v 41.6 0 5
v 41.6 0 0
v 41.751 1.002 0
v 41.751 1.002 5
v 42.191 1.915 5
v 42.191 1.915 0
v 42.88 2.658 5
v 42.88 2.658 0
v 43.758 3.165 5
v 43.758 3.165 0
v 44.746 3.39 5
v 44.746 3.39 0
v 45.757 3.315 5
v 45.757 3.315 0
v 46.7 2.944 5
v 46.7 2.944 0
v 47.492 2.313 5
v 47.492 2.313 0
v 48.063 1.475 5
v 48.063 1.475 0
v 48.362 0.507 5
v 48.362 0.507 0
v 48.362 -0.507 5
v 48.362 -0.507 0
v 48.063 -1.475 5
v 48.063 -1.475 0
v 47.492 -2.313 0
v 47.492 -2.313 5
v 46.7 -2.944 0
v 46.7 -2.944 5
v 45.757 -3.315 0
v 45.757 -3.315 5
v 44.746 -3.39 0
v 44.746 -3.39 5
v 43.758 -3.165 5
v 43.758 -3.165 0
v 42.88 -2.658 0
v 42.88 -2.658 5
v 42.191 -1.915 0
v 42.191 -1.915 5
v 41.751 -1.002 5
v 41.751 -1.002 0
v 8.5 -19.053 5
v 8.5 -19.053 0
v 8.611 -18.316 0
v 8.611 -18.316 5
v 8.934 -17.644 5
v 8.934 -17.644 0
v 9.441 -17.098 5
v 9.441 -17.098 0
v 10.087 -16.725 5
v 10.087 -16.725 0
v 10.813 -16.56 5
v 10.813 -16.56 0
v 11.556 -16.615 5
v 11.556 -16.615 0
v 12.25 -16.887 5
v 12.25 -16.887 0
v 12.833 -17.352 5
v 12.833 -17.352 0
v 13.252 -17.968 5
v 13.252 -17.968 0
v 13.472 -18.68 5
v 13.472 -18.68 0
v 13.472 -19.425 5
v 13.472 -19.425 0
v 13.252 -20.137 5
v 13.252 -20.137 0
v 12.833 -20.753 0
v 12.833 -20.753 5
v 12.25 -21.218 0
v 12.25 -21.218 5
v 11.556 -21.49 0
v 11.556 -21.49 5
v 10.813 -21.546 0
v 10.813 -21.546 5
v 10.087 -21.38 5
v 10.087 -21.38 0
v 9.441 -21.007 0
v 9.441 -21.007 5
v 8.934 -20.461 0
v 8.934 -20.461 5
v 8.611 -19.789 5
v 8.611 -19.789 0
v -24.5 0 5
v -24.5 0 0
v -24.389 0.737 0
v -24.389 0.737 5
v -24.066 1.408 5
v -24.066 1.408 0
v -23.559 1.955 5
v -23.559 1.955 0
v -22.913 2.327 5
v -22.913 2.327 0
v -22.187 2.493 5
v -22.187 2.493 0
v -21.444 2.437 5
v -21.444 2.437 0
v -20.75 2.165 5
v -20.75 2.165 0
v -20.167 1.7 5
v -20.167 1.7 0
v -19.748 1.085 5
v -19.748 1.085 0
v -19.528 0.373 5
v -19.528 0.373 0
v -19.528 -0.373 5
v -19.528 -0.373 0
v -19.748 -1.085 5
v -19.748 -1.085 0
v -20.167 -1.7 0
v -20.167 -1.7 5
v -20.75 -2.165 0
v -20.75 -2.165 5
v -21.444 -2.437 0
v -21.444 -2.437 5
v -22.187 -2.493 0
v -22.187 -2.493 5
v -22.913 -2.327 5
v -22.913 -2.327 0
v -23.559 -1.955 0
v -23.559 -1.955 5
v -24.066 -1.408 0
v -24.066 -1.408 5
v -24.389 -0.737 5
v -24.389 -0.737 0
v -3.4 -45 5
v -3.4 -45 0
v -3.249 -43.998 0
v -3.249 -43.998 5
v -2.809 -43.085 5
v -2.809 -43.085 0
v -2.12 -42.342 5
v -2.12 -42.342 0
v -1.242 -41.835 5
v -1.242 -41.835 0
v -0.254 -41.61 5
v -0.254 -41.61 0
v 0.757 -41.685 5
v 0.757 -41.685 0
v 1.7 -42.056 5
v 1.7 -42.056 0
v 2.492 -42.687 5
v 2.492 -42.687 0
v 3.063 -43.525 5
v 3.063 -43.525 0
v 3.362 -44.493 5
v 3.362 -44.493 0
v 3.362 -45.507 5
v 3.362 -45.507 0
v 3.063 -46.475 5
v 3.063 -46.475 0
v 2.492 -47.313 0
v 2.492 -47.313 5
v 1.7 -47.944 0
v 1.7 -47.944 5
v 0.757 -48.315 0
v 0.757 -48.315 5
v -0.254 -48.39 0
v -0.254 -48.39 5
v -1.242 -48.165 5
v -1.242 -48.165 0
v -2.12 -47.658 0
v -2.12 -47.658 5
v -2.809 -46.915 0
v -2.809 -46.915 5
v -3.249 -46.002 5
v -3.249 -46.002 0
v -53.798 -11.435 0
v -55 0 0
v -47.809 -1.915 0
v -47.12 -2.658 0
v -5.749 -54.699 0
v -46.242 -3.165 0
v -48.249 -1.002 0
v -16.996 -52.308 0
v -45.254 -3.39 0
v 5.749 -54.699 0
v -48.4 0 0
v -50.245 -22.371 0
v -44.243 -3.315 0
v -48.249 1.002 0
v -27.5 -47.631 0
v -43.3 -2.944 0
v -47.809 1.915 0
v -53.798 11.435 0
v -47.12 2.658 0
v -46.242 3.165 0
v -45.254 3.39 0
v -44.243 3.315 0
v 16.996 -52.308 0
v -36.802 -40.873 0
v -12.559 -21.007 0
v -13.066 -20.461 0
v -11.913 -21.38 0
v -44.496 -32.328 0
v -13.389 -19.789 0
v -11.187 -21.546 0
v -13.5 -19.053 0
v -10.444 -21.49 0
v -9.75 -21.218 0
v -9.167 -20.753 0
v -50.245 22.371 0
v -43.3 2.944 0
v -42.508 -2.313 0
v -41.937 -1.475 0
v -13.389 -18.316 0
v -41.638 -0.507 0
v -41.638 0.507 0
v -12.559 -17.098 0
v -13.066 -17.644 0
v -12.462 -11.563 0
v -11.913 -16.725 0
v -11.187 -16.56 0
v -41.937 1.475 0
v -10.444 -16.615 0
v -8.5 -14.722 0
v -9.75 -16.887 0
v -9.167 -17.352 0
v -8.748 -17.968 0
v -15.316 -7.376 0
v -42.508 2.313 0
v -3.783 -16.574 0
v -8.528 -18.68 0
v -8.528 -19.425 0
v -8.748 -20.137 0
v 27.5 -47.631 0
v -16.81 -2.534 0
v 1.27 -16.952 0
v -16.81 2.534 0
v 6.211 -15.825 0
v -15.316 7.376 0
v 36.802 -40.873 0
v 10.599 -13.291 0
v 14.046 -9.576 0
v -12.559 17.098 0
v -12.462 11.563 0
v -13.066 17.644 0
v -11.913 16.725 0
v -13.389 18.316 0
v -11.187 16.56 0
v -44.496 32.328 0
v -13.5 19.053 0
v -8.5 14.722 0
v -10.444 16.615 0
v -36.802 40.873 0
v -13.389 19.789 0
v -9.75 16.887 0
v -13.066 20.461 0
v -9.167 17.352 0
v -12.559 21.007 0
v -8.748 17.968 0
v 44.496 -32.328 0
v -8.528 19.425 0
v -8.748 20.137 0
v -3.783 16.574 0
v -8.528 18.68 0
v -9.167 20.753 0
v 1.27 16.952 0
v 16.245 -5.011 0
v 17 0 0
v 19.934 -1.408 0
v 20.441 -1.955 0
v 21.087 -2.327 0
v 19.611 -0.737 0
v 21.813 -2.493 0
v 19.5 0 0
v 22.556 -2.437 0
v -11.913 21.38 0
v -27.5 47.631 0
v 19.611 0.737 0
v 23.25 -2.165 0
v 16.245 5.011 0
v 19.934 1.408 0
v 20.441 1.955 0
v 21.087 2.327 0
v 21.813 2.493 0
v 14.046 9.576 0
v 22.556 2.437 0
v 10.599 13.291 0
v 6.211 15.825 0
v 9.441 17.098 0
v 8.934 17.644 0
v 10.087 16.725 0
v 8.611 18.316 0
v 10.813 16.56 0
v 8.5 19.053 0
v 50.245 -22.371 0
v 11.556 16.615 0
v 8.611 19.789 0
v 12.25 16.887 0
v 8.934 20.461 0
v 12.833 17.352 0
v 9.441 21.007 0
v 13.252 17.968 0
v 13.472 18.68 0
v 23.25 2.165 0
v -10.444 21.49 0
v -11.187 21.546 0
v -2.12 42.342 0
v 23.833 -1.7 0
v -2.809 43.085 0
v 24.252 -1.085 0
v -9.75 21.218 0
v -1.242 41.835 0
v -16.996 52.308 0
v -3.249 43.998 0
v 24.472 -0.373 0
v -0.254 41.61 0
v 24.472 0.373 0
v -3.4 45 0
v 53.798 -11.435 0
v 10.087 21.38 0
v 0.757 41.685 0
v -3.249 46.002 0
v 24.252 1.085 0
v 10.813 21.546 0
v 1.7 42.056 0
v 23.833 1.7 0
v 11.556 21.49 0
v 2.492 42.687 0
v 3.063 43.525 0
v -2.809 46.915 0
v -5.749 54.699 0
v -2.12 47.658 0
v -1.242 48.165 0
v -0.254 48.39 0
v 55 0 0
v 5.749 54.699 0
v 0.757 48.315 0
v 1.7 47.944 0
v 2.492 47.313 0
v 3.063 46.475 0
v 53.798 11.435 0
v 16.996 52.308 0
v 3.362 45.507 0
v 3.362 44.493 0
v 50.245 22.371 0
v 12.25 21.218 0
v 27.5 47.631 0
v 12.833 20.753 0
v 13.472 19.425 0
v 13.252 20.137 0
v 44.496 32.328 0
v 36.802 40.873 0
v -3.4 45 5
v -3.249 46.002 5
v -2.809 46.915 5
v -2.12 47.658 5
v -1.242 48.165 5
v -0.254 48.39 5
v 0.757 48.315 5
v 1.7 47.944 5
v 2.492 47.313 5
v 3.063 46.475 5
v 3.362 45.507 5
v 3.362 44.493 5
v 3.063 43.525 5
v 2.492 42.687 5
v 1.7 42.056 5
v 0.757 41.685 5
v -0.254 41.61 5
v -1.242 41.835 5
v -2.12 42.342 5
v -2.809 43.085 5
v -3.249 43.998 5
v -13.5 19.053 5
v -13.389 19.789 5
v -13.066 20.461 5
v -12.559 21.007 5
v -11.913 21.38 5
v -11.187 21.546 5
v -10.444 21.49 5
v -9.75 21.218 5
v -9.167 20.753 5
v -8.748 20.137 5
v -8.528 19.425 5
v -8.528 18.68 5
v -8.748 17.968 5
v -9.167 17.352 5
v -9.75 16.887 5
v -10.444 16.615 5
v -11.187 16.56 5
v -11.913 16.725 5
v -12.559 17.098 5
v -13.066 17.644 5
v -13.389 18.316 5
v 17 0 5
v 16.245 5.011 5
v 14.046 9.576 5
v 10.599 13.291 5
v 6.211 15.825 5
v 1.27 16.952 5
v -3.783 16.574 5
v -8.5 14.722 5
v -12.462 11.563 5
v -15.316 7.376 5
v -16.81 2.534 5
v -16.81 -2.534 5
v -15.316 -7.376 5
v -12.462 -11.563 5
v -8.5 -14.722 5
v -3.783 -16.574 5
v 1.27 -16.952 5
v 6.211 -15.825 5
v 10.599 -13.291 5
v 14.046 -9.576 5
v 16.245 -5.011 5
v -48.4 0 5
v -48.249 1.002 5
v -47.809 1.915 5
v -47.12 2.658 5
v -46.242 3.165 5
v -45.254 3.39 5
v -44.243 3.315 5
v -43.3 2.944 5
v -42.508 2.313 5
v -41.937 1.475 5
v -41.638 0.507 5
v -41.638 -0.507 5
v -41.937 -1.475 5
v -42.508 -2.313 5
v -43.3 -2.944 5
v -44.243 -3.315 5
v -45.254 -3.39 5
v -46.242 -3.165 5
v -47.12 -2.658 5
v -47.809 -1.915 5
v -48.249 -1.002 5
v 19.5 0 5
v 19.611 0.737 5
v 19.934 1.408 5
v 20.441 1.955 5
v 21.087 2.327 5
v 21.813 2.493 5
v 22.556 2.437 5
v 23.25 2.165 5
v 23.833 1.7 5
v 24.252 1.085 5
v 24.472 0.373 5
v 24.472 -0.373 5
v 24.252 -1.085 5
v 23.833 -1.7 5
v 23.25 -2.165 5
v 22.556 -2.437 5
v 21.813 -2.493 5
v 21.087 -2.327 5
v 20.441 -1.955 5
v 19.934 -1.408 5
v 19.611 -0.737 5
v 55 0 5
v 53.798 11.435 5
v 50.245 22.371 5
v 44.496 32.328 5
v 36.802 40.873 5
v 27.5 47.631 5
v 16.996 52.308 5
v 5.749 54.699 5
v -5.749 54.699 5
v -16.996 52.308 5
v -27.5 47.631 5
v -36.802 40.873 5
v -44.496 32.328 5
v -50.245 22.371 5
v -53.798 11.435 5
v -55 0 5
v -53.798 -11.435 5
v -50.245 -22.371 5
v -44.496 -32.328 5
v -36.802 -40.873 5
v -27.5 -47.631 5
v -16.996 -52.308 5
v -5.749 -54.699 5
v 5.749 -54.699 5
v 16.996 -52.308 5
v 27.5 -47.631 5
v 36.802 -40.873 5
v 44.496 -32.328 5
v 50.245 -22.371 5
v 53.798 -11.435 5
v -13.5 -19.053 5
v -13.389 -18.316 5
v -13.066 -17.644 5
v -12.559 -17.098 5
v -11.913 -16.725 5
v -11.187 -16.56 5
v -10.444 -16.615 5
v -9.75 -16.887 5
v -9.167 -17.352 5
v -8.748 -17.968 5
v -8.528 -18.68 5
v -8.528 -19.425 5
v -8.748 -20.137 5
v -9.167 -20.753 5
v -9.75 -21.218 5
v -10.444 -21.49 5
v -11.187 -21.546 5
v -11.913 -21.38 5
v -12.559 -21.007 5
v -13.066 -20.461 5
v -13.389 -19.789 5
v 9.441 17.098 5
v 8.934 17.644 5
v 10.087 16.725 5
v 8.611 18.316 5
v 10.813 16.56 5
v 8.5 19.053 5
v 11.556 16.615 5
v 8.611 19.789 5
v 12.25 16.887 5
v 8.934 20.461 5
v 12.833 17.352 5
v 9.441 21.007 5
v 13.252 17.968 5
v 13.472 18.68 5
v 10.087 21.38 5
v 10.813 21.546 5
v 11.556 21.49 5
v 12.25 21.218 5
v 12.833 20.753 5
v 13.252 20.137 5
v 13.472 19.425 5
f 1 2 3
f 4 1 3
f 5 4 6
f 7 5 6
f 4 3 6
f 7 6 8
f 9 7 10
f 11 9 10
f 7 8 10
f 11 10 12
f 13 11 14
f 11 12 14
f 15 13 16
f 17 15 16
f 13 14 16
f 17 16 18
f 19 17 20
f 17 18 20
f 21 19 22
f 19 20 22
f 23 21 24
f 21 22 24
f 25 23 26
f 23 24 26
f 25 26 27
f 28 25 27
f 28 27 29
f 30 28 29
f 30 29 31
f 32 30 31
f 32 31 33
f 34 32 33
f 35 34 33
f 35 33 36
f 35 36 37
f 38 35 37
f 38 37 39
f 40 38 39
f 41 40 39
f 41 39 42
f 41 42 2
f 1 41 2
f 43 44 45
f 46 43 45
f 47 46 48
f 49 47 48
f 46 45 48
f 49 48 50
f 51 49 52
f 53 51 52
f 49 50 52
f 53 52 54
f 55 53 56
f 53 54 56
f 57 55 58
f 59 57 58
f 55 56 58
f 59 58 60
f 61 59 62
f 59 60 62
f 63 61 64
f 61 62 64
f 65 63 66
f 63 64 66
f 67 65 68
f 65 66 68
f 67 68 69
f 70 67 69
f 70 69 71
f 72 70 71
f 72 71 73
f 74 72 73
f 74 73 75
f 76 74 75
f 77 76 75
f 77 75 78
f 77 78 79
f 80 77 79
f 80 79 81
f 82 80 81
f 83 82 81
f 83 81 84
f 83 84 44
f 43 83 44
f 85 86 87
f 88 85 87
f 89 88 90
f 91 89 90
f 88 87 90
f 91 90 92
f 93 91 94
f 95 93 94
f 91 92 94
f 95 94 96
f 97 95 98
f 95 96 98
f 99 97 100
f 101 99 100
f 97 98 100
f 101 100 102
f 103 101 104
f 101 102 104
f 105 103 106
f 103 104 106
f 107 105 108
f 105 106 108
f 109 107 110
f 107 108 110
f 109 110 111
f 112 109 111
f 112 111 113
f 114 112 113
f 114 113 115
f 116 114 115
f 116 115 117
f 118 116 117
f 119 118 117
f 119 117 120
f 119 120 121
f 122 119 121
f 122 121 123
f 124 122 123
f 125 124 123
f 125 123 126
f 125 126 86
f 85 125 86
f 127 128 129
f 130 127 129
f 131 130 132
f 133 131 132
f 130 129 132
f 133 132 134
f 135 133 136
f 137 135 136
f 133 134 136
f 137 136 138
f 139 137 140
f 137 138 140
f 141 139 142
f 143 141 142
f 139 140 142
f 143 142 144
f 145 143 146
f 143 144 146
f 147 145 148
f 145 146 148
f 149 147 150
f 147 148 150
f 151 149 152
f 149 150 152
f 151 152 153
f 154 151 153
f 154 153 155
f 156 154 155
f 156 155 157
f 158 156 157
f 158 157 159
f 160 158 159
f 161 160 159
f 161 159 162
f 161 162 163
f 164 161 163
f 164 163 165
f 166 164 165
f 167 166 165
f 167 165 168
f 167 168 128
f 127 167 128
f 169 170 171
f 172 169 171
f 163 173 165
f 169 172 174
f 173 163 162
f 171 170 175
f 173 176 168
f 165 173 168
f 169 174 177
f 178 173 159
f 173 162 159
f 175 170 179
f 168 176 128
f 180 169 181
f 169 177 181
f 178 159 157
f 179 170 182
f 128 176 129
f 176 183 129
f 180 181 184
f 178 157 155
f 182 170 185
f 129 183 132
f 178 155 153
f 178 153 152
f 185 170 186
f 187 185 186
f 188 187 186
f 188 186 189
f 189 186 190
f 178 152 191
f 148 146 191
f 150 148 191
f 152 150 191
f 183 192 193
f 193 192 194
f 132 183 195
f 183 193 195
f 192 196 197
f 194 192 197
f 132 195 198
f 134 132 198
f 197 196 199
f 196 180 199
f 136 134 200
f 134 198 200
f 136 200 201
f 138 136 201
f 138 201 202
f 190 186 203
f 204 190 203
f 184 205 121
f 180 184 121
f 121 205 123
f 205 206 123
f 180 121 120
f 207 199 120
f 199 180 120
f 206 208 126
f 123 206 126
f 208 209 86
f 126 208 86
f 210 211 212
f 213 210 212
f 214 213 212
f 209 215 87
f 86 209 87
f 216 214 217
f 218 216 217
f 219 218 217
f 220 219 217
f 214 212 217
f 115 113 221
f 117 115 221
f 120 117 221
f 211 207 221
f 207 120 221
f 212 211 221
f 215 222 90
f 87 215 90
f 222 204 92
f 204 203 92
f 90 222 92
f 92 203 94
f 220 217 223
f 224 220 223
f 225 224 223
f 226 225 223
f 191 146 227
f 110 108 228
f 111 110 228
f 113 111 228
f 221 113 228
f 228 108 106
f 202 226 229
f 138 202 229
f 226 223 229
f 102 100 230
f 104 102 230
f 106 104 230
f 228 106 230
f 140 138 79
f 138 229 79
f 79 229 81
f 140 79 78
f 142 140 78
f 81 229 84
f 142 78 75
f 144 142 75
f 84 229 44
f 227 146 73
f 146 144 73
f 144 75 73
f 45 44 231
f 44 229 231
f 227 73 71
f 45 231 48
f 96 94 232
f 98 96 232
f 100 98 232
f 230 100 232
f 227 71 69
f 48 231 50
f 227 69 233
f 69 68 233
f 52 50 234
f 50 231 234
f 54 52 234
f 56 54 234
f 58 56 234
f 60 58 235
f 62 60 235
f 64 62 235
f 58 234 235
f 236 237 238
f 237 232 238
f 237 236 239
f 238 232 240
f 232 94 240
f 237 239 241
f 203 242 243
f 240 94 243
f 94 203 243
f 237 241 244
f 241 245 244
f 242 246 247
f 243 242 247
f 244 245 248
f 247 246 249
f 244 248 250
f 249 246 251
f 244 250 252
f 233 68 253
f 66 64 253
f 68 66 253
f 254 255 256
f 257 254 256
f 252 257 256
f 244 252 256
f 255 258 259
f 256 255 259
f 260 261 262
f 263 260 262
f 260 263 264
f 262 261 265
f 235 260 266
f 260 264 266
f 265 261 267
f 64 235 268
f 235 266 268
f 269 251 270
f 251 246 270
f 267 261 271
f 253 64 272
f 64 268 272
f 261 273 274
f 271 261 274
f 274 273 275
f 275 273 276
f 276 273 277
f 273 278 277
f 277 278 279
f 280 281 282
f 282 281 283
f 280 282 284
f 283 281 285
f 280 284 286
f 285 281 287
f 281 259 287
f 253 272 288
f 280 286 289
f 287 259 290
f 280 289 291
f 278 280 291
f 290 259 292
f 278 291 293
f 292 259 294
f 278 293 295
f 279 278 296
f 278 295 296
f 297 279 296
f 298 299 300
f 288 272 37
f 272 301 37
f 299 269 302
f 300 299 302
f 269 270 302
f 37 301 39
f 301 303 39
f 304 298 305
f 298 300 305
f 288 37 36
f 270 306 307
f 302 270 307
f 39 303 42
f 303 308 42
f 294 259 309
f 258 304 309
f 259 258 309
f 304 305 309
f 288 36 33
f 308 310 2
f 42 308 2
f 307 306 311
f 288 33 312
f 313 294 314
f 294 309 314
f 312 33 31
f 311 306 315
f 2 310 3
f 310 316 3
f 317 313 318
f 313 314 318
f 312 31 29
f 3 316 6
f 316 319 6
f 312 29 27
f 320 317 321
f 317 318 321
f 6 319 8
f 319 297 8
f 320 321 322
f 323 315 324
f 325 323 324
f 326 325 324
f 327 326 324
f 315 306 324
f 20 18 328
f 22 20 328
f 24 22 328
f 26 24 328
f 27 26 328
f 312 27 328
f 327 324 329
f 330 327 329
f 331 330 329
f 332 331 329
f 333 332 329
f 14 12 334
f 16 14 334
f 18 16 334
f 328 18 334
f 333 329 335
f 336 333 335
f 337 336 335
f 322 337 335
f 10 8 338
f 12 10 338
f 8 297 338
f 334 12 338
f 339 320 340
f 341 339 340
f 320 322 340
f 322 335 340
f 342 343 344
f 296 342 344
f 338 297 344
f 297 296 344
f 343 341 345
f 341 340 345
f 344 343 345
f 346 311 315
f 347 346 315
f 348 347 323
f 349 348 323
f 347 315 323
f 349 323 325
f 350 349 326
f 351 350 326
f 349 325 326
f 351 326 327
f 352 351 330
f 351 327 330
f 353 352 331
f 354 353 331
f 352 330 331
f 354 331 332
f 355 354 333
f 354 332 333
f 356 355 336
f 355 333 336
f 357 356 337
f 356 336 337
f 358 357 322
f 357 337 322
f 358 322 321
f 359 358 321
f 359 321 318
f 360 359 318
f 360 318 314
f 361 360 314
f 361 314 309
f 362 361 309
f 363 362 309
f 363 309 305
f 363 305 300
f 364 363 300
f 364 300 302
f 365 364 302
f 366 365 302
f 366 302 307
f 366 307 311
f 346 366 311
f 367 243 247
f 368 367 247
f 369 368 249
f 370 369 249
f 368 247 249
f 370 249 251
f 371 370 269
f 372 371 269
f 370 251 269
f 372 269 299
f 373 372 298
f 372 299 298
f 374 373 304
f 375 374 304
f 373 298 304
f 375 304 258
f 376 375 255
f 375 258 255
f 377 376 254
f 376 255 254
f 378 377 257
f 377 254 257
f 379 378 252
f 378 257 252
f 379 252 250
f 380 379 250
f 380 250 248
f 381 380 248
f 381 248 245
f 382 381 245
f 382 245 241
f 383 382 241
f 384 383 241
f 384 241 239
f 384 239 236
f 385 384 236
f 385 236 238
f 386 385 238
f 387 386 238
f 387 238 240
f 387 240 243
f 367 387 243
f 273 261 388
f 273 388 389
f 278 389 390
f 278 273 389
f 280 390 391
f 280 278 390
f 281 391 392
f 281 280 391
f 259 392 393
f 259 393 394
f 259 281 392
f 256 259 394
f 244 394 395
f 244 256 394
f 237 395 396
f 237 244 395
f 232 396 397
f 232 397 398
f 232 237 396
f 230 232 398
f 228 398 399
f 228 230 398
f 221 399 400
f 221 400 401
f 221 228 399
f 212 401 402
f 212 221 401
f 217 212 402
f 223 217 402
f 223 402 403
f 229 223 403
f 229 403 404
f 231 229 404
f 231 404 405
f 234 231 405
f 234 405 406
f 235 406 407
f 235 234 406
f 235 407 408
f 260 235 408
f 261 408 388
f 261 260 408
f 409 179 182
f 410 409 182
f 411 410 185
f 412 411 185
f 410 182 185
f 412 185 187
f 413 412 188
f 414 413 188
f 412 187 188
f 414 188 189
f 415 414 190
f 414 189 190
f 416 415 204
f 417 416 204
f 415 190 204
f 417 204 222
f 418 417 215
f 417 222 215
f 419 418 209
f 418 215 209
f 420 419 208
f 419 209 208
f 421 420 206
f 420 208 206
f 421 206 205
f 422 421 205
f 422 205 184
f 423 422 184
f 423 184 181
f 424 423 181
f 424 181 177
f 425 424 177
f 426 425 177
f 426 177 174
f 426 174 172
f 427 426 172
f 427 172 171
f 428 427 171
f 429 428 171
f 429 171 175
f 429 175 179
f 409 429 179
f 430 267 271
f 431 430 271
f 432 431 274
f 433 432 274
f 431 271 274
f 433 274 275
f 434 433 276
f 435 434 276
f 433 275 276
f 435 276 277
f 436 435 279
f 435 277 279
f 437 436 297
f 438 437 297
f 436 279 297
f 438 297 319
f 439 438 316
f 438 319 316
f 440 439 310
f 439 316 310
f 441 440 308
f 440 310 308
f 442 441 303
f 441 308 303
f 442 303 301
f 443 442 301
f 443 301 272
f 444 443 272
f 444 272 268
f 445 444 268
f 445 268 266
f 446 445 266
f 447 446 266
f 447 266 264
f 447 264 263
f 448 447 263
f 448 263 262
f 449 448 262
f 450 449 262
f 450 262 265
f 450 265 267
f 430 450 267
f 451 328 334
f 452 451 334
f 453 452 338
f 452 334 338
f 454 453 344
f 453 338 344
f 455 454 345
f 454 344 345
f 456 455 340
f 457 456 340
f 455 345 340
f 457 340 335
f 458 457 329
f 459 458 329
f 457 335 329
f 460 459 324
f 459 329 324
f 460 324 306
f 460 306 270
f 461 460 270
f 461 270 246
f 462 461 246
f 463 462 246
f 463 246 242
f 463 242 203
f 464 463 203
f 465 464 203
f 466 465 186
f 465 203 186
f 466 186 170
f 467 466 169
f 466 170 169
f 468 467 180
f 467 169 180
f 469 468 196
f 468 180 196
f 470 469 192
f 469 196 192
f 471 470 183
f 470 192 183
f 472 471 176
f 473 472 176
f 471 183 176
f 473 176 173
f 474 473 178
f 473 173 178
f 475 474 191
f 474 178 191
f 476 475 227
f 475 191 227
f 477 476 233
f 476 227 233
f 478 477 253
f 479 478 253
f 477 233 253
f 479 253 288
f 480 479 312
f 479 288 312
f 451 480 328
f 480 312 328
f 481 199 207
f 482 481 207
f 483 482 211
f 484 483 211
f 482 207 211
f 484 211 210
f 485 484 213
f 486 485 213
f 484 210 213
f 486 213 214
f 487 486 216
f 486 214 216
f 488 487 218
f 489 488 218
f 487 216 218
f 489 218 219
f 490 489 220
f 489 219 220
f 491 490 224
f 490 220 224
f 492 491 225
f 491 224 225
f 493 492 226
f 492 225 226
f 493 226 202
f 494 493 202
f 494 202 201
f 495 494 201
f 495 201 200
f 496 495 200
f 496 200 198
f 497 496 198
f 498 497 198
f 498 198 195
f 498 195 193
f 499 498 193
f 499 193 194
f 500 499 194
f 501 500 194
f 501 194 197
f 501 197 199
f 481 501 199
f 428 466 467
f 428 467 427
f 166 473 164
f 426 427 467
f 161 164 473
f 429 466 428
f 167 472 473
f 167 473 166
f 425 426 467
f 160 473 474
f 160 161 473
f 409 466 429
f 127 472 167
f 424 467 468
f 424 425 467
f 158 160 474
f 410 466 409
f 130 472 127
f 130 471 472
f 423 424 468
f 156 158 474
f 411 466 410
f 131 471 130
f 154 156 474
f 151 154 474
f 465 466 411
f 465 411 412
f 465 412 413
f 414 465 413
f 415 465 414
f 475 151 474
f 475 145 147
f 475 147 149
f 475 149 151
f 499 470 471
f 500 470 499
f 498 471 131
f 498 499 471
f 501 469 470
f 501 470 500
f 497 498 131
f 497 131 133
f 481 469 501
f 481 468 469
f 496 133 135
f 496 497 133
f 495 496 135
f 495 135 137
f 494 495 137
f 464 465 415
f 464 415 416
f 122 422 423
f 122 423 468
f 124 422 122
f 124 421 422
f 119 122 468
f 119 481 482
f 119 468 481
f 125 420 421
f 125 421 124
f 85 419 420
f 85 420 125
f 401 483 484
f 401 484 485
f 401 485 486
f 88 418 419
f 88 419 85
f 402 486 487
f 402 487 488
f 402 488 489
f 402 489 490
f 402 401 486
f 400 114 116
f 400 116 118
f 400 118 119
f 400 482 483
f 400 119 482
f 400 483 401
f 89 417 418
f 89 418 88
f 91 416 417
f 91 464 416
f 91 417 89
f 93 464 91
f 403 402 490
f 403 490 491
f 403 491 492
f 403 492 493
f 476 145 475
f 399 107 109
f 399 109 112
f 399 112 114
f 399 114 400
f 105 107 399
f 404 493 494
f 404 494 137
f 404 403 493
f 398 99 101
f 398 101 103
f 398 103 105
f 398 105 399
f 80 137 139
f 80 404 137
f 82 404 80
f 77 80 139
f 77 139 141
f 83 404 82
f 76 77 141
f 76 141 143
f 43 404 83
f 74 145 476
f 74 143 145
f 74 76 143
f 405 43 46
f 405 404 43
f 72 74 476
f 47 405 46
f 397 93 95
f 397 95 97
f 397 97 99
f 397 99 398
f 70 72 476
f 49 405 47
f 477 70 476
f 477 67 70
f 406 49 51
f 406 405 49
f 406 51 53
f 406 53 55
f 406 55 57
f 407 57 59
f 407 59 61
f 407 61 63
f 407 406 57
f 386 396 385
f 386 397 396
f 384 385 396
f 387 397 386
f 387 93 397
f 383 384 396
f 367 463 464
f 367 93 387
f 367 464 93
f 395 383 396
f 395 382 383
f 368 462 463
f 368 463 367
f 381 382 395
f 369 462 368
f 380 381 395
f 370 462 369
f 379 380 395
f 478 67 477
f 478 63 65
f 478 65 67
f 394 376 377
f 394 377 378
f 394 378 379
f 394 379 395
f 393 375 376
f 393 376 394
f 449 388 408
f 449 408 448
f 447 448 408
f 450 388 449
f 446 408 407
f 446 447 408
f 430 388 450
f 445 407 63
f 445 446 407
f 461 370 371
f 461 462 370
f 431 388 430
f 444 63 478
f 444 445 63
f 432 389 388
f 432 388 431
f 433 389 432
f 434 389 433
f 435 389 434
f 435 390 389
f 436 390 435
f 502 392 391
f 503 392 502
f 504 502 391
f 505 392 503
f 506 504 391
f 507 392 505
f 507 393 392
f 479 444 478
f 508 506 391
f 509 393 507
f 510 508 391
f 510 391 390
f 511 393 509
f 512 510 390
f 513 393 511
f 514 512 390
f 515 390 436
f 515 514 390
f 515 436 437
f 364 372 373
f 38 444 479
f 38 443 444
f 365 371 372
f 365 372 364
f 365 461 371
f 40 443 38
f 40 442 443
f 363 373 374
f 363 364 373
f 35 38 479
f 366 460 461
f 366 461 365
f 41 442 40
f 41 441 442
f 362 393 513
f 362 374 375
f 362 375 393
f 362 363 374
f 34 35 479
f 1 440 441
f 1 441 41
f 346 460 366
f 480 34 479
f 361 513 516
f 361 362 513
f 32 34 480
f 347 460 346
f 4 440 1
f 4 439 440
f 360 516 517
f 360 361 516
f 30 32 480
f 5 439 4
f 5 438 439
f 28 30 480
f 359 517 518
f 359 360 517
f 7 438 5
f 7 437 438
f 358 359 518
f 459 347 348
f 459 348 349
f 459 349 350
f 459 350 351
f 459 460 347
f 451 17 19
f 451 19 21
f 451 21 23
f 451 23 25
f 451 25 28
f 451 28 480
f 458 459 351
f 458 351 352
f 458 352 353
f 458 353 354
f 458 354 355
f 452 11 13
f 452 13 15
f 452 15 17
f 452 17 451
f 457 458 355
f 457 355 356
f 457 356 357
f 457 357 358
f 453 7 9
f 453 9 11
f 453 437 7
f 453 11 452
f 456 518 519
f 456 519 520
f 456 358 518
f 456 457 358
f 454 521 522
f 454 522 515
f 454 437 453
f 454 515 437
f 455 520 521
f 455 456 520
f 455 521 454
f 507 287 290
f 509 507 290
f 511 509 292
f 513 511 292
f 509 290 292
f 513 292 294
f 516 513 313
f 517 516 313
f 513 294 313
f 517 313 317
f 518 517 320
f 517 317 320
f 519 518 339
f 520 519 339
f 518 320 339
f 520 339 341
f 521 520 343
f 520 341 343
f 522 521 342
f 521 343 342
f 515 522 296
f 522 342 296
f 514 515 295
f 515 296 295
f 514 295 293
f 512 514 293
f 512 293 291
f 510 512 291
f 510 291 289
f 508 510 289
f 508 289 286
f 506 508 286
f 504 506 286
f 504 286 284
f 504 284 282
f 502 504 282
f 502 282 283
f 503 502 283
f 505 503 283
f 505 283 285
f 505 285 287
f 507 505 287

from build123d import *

# Parameters (mm, degrees)
ESQUISSE1_R                               = 55
ESQUISSE1_R_2                             = 17
BOSS_EXTRU_1_DEPTH                        = 5
TROU_POUR_TARAUDAGE_POUR_TROU_TARAUD_M8_D = 6.8
TROU_POUR_TARAUDAGE_POUR_TROU_TARAUD_M6_D = 5


with BuildPart() as part:
    # Esquisse1 → Boss.-Extru.1 (new body)
    with BuildSketch(Plane.XY):
        Circle(ESQUISSE1_R)
        Circle(ESQUISSE1_R_2, mode=Mode.SUBTRACT)
    extrude(amount=BOSS_EXTRU_1_DEPTH)

    # Trou pour taraudage pour trou taraudé M8x1.252 (through all)
    with Locations(Plane.XY.offset(5)):
        with Locations((0, 45), (45, 0), (0, -45), (-45, 0)):
            Hole(TROU_POUR_TARAUDAGE_POUR_TROU_TARAUD_M8_D / 2)

    # Trou pour taraudage pour trou taraudé M6x1.02 (through all)
    with Locations(Plane.XY.offset(5)):
        with Locations((11, 19.052558883), (22, 0), (11, -19.052558883), (-11, -19.052558883), (-22, 0), (-11, 19.052558883)):
            Hole(TROU_POUR_TARAUDAGE_POUR_TROU_TARAUD_M6_D / 2)


solid = part.part
